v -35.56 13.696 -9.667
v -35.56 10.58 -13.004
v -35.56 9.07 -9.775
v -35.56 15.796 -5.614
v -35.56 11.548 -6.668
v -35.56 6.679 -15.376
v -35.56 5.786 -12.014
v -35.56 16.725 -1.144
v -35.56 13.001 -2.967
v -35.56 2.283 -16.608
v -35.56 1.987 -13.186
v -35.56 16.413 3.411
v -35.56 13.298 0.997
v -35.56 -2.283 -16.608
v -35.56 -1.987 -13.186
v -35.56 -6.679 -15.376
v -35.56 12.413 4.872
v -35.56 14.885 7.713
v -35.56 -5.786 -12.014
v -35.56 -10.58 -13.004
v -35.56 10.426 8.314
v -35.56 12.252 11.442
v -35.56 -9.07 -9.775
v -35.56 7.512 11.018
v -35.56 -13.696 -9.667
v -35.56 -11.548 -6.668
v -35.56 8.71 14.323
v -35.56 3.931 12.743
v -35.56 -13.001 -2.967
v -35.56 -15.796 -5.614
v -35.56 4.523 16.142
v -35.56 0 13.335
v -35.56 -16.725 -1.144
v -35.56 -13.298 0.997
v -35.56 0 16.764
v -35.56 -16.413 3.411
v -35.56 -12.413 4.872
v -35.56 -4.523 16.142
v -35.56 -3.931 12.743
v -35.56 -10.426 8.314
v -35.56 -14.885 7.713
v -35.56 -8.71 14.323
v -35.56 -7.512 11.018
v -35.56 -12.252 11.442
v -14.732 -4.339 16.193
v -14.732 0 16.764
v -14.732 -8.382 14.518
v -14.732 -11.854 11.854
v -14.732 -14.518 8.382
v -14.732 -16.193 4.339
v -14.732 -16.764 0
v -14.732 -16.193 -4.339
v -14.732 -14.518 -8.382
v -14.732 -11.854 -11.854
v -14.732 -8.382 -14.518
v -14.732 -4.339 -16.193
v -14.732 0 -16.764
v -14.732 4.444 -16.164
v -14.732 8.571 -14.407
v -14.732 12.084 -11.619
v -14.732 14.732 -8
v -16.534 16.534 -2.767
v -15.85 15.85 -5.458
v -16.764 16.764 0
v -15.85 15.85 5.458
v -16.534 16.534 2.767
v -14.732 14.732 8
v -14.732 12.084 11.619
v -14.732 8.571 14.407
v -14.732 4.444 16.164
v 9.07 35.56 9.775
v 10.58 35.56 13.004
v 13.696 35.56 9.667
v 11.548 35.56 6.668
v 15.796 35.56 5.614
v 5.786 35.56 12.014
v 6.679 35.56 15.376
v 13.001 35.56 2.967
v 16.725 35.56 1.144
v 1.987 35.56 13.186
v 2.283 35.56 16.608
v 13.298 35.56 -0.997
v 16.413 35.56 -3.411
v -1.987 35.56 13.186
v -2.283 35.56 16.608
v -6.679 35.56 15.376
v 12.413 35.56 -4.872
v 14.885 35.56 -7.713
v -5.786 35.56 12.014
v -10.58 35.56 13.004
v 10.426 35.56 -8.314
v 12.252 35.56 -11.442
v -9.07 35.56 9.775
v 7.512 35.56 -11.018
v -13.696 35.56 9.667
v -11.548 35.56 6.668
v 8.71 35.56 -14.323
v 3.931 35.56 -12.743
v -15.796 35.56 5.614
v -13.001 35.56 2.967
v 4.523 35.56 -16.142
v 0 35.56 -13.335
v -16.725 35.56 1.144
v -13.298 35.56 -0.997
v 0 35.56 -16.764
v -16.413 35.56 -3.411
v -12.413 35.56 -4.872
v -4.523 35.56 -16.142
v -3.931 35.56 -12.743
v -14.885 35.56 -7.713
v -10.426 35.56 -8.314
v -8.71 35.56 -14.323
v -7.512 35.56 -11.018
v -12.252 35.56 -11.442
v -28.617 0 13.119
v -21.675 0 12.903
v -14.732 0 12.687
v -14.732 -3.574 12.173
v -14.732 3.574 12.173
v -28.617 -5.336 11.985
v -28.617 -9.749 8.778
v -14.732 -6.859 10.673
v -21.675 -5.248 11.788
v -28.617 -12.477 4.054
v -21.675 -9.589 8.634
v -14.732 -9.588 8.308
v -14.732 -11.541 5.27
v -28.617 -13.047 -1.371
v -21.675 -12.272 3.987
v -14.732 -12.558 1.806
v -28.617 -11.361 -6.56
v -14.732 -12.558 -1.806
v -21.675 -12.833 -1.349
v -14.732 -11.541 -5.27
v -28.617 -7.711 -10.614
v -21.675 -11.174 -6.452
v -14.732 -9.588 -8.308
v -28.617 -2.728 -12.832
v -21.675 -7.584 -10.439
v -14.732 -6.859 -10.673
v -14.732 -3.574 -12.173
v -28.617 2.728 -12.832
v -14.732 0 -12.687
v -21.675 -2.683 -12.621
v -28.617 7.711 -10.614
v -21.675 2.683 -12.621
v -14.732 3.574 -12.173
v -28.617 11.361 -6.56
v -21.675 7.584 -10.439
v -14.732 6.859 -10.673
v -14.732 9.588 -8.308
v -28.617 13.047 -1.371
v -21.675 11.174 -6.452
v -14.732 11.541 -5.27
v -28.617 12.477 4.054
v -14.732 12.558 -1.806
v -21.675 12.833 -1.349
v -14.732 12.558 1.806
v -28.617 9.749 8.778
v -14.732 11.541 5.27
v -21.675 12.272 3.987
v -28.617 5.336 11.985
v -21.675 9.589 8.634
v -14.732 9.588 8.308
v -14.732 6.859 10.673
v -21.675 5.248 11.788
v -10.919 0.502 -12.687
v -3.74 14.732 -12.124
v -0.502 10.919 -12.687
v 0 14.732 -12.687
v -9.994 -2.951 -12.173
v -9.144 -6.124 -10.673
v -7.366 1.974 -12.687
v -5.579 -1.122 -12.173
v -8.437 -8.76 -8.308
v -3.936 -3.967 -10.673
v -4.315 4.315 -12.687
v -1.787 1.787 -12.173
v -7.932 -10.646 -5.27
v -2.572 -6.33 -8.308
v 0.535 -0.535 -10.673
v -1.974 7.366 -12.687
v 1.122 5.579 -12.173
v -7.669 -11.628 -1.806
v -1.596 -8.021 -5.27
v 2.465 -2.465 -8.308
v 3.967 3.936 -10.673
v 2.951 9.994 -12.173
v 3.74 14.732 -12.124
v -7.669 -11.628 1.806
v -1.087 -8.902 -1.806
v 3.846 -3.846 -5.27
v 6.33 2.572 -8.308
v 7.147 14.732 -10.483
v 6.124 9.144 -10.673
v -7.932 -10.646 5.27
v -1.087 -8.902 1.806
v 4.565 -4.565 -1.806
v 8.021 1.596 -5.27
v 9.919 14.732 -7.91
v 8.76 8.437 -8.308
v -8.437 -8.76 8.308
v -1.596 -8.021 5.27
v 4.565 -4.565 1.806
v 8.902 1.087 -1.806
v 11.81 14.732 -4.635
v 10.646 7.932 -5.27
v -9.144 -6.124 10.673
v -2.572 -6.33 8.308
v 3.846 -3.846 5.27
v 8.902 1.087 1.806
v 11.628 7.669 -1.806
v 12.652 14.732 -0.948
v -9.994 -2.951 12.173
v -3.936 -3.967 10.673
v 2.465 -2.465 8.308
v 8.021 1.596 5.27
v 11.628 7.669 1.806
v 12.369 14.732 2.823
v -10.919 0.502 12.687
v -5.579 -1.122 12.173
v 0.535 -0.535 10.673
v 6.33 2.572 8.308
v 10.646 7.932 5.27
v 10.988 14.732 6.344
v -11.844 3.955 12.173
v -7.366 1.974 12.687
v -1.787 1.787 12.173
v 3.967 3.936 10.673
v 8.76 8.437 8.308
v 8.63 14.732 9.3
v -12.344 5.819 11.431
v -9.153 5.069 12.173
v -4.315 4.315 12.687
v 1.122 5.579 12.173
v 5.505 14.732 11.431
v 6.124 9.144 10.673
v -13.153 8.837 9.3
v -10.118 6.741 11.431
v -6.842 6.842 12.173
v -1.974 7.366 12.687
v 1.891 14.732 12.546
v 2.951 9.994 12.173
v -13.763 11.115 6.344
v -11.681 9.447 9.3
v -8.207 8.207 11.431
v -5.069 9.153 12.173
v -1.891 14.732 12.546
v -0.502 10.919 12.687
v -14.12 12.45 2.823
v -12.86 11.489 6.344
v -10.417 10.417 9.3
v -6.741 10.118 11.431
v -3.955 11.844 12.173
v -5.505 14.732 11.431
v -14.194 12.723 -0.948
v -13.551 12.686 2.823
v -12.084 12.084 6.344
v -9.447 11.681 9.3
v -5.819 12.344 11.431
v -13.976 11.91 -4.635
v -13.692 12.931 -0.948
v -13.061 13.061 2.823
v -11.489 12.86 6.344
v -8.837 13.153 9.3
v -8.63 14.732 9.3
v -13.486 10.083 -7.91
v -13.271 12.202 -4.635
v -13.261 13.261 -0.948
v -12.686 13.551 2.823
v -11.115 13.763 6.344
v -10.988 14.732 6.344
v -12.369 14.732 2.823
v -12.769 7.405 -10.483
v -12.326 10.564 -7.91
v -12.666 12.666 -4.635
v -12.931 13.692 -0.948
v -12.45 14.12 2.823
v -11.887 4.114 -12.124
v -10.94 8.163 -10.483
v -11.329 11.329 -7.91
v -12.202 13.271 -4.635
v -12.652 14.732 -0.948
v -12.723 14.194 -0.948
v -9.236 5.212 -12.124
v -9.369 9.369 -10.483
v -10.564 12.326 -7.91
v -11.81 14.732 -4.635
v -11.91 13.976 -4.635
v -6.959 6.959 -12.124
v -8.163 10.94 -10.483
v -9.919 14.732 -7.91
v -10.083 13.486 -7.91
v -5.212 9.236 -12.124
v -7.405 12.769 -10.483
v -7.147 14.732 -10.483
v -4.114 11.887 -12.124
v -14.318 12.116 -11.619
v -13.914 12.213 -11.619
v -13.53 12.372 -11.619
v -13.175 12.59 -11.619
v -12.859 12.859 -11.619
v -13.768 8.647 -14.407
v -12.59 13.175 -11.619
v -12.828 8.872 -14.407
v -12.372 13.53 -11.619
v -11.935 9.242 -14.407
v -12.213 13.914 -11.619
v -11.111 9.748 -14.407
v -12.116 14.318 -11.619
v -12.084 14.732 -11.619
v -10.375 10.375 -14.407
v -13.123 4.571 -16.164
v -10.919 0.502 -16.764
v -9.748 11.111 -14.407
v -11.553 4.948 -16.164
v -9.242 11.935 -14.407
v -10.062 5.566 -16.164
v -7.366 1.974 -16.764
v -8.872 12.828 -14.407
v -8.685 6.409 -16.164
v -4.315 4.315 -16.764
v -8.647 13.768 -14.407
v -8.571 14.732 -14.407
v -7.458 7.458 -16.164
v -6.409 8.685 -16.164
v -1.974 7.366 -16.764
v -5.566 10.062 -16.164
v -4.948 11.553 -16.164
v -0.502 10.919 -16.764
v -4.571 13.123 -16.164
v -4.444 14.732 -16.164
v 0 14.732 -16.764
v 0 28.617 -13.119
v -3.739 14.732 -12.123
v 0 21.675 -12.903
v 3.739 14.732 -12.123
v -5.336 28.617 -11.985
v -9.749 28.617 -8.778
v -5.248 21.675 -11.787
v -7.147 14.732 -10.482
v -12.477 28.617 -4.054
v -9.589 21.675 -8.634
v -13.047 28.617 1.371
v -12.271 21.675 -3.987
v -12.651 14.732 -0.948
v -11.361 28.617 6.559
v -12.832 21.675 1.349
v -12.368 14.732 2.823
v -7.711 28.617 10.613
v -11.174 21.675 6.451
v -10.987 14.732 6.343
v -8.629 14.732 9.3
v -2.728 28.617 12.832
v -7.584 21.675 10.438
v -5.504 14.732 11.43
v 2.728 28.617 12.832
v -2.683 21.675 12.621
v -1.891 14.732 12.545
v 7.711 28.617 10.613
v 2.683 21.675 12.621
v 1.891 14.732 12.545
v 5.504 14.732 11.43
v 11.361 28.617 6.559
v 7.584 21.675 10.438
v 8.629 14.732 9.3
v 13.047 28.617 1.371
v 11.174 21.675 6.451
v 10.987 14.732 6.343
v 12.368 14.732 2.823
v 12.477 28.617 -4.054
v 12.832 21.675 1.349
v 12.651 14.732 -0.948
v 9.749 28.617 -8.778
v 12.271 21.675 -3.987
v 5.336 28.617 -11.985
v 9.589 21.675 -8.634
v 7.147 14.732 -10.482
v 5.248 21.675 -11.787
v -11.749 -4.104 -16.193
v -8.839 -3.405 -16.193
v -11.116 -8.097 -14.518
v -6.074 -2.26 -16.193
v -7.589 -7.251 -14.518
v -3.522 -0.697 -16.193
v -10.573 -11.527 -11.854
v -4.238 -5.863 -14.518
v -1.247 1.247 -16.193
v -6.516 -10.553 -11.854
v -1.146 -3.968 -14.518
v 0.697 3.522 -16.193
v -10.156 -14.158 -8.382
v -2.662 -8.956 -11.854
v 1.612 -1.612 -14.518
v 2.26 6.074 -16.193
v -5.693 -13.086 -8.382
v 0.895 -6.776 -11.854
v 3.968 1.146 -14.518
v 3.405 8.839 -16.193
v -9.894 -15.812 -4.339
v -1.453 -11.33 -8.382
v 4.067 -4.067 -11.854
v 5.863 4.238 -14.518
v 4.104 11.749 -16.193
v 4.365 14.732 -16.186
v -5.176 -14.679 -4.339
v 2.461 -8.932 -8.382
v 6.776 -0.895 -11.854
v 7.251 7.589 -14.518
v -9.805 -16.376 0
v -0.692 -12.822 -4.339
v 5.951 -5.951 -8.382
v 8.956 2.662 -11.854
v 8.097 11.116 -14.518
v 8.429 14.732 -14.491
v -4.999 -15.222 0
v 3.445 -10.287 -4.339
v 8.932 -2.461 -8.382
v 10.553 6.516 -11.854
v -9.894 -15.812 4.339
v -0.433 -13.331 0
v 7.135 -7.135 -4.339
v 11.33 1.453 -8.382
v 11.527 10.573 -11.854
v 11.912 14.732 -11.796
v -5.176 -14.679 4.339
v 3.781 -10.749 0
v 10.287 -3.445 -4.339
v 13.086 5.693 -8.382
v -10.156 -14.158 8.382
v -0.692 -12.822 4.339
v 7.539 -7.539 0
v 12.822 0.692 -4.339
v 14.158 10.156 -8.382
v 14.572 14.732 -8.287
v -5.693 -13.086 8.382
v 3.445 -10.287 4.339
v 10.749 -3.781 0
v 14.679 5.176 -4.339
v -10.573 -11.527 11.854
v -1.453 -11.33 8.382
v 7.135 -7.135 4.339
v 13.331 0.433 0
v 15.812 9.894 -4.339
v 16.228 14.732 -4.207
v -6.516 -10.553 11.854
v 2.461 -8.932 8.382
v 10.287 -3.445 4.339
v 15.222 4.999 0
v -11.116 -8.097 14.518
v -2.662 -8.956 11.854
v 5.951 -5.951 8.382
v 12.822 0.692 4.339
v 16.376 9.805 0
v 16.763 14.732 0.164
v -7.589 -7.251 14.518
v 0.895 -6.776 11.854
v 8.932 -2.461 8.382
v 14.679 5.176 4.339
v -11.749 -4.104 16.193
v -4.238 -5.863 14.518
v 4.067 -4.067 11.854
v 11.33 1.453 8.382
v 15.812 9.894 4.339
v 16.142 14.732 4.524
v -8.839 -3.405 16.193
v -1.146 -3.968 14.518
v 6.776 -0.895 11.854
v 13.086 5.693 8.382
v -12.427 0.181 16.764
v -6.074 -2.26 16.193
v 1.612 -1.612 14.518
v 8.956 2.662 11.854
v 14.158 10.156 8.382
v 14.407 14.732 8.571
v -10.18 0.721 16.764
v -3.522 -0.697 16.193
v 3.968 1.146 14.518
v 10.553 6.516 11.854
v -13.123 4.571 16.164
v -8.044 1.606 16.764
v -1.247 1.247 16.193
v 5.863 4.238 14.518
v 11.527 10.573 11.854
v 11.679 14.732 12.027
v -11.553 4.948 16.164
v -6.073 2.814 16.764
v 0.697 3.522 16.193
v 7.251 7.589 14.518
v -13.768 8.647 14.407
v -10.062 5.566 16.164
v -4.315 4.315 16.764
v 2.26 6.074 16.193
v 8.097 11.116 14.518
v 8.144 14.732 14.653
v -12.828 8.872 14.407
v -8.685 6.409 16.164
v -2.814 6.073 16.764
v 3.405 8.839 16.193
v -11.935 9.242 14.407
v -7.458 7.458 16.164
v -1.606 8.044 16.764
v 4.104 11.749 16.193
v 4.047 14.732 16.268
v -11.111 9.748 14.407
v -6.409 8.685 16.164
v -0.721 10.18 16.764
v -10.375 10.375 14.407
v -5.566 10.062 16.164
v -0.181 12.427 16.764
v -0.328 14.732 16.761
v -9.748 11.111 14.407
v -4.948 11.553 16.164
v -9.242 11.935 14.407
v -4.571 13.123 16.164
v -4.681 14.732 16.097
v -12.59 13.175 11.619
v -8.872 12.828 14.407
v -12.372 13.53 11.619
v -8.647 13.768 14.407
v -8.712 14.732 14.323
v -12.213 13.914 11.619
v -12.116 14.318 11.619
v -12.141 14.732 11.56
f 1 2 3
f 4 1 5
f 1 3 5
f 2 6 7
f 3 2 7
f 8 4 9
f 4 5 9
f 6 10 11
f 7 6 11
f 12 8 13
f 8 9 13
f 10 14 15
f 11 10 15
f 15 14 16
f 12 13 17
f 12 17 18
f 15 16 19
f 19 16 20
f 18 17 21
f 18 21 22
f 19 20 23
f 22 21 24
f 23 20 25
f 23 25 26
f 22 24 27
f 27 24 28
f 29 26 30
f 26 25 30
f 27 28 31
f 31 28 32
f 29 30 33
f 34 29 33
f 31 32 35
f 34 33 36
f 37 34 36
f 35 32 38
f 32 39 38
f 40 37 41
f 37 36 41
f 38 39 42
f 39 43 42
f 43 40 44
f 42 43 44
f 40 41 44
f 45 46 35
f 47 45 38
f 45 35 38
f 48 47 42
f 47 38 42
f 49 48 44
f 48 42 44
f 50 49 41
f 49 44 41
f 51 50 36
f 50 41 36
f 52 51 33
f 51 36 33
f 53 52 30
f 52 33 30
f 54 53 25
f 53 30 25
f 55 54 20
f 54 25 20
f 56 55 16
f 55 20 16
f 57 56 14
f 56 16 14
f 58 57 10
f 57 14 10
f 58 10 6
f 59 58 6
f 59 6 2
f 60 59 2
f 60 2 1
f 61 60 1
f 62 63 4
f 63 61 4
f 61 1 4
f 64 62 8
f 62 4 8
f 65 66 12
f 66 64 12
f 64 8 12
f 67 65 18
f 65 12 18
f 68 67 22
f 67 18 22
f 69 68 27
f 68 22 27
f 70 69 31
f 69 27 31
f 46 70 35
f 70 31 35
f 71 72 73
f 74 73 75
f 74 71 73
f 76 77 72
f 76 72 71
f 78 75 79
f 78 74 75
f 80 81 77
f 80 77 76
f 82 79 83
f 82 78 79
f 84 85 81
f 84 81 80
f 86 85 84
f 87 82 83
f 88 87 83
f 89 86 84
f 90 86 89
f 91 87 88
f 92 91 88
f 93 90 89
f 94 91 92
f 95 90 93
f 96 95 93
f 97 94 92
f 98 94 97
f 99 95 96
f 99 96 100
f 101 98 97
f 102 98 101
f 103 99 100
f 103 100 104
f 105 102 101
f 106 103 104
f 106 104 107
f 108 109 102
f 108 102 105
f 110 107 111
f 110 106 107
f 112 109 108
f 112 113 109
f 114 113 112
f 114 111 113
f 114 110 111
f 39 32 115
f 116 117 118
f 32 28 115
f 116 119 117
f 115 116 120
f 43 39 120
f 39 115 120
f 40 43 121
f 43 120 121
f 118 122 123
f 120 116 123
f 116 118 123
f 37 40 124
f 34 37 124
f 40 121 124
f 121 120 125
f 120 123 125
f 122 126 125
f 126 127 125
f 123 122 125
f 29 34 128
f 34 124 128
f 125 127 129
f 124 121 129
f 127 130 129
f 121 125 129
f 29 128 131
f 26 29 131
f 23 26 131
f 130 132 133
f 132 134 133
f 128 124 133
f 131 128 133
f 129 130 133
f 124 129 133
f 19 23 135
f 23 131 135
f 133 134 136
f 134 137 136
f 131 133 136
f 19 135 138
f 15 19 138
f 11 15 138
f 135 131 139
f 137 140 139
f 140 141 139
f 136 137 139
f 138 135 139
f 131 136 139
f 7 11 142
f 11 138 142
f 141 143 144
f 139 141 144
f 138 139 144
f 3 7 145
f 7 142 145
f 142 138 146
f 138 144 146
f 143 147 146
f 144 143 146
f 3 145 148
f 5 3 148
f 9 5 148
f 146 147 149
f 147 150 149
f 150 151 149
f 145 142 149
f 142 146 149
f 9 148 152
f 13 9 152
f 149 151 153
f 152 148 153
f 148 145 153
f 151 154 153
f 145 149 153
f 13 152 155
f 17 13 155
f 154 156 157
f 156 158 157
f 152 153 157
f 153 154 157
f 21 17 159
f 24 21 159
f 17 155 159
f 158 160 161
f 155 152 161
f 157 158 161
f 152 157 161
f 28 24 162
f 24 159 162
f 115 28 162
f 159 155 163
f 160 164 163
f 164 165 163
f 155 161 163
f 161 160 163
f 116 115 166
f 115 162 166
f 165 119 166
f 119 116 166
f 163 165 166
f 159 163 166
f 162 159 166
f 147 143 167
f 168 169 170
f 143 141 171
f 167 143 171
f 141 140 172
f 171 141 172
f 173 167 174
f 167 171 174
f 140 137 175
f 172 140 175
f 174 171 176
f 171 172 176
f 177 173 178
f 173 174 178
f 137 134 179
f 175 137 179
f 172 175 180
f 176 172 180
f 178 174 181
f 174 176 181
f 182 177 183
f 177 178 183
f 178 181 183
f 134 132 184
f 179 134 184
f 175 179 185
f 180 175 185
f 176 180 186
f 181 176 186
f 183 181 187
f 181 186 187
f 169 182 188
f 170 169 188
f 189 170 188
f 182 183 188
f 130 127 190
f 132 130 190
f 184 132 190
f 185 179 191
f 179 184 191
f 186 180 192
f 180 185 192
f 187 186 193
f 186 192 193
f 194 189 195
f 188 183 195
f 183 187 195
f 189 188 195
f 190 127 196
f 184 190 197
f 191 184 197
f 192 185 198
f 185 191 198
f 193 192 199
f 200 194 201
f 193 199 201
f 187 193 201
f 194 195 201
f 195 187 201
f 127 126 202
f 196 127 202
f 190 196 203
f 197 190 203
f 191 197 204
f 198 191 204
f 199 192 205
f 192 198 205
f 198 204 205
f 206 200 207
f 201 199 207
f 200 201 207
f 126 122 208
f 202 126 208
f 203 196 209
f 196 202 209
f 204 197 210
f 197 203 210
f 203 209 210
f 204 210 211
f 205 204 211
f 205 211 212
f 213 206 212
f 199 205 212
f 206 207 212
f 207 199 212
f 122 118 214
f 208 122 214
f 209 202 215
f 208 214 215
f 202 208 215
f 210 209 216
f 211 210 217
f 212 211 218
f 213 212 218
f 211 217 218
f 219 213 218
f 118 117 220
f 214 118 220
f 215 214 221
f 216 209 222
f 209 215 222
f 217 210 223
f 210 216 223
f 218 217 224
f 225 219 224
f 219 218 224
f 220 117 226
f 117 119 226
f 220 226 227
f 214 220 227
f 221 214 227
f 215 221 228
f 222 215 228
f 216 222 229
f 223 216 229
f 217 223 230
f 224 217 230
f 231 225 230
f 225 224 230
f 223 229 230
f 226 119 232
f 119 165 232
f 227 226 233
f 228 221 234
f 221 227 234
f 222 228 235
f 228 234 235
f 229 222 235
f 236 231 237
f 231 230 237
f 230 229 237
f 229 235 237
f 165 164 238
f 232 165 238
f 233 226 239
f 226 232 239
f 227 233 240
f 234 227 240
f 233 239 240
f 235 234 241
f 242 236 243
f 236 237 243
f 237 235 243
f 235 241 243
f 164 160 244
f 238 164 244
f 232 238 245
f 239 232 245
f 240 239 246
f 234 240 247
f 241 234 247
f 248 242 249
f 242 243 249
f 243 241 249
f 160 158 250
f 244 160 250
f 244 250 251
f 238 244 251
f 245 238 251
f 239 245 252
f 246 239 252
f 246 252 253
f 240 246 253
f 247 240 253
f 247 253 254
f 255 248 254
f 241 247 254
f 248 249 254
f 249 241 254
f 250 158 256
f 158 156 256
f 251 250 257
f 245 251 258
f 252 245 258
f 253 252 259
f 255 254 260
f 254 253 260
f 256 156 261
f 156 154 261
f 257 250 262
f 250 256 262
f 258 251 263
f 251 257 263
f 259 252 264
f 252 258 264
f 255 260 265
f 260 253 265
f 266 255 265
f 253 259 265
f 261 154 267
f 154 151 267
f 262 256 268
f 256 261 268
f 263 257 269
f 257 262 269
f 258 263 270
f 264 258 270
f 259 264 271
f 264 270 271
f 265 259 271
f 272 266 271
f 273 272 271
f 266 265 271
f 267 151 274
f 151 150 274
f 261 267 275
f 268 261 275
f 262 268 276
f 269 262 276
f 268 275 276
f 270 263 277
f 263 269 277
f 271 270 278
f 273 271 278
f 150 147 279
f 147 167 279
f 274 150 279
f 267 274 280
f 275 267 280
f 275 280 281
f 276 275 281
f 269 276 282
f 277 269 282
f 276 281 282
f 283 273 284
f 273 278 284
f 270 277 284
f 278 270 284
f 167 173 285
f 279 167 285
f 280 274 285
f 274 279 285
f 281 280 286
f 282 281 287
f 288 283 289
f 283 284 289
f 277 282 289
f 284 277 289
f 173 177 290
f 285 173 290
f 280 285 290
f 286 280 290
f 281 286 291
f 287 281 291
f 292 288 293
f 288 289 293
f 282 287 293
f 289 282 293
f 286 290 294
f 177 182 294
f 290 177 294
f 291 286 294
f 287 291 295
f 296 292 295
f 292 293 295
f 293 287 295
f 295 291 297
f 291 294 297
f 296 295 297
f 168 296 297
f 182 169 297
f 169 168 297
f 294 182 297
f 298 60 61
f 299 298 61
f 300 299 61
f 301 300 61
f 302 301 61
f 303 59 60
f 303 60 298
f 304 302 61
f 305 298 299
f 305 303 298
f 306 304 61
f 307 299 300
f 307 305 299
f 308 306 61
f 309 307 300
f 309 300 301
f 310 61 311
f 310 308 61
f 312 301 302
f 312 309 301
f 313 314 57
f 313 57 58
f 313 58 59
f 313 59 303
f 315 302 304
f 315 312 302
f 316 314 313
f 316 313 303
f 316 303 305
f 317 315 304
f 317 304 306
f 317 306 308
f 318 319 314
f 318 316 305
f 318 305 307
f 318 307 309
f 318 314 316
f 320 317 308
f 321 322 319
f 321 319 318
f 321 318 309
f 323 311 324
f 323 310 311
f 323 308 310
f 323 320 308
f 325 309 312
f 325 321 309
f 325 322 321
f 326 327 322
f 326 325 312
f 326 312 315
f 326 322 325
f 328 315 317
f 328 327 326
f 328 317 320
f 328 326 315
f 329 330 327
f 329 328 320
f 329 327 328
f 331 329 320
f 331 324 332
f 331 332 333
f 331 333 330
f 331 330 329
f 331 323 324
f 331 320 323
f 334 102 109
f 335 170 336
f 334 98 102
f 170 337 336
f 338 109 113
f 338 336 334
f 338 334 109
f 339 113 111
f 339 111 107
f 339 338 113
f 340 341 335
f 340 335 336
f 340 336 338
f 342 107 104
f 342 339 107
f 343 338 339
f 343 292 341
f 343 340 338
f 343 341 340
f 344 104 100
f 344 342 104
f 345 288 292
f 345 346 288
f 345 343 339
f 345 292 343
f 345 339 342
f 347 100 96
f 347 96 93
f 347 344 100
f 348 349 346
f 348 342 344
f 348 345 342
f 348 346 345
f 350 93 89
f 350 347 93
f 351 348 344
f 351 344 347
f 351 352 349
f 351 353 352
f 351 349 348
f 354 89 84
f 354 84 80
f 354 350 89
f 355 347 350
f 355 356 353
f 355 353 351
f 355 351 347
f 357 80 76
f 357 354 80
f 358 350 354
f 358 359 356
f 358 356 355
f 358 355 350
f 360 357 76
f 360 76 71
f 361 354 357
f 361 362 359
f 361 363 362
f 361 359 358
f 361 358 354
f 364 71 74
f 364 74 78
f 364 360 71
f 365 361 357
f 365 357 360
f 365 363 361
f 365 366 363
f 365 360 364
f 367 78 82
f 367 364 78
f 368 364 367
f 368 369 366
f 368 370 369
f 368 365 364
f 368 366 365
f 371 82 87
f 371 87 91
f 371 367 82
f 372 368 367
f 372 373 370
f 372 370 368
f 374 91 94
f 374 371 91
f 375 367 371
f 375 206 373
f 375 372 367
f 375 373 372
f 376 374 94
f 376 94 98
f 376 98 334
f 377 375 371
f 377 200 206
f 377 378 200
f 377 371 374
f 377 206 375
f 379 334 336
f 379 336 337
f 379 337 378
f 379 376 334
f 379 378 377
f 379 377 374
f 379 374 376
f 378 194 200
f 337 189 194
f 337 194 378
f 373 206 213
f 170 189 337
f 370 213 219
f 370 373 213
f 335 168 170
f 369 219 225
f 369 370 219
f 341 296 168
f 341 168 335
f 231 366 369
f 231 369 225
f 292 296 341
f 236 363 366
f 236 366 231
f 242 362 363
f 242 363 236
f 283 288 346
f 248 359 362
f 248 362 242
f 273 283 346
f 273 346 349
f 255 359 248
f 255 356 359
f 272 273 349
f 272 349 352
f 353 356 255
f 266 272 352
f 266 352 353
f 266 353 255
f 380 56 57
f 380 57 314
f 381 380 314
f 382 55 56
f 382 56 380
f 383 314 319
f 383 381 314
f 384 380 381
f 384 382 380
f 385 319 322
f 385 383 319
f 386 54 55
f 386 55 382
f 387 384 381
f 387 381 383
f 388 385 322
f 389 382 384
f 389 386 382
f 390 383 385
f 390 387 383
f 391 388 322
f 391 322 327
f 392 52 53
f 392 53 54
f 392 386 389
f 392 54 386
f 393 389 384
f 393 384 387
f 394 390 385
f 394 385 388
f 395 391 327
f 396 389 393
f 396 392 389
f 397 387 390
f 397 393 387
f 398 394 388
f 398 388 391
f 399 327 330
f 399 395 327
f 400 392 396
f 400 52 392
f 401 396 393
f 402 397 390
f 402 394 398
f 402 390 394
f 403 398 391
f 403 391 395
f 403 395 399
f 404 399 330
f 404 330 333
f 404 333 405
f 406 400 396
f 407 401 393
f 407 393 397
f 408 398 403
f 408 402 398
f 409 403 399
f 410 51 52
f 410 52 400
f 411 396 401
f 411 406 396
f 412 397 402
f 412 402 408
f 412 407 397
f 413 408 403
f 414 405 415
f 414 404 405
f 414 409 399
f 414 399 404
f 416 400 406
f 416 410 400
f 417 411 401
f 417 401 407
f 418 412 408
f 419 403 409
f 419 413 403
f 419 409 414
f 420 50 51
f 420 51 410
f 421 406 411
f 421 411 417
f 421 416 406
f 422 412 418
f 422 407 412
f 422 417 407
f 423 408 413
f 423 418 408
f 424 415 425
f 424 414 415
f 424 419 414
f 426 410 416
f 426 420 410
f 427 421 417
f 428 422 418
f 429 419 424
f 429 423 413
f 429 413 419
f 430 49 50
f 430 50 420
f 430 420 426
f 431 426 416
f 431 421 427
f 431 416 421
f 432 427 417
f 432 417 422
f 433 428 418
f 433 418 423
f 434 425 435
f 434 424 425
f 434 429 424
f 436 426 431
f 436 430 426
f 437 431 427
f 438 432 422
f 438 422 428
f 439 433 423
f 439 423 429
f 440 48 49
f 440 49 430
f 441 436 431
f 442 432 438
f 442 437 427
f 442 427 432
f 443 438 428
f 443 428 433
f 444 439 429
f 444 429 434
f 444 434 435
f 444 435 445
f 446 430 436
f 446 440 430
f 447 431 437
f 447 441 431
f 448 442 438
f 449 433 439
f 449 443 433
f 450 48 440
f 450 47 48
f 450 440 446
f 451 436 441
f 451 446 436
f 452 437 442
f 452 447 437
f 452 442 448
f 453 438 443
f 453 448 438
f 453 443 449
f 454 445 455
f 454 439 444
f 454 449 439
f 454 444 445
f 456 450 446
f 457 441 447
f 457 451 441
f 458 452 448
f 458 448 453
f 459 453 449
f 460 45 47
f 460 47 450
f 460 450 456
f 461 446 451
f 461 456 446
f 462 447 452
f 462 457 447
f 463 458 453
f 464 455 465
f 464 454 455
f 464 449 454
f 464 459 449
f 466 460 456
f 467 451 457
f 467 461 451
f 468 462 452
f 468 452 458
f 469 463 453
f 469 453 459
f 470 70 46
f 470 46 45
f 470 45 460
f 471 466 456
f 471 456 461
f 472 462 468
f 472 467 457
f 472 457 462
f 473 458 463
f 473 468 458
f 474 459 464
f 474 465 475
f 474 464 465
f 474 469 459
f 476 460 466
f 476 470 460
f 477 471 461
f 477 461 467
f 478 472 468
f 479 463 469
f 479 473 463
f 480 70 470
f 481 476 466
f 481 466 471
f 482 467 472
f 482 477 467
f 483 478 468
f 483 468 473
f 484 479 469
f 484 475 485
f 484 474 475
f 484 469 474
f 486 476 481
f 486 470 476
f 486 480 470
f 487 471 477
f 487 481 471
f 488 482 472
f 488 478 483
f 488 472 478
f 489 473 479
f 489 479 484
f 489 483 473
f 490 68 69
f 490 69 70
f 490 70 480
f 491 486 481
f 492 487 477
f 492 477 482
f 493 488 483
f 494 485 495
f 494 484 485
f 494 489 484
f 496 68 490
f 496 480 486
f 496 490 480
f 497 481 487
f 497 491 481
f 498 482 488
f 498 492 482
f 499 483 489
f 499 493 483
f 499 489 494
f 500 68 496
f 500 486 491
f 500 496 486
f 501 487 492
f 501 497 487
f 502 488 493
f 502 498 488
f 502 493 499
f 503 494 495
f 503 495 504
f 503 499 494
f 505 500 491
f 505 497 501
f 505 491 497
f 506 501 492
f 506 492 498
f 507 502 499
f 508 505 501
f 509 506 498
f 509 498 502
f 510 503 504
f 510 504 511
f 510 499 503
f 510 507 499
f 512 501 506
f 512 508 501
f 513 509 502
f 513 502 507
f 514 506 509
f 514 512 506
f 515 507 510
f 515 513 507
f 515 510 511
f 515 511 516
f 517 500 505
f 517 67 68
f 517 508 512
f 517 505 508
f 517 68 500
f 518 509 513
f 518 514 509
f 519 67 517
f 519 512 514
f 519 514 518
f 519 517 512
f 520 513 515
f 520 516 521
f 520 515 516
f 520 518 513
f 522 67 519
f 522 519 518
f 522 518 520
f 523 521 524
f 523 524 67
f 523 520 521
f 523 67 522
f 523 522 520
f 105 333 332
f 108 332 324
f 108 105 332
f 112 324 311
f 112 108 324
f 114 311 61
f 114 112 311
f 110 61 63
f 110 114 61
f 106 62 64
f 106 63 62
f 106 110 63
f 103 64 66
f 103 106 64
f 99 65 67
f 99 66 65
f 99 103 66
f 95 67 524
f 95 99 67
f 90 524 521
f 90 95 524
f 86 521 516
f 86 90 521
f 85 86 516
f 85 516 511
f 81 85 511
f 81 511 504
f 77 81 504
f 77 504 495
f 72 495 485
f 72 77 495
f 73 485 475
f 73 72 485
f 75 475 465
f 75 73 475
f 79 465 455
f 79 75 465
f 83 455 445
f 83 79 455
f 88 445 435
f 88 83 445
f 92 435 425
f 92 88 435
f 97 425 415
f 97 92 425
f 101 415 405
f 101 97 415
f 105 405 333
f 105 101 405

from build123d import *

# Parameters (mm, degrees)
SKETCH3_R   = 16.764
SKETCH3_R_2 = 12.6873


with BuildPart() as part:
    # Sketch1 → Revolve1 (revolve)
    with BuildSketch(Plane.XY):
        Polygon((-14.732, -12.6873), (-14.732, -16.764), (-35.56, -16.764), (-35.56, -13.335), align=None)
    revolve(axis=Axis((-35.56, 0, 0), (1, 0, 0)))


with BuildPart() as body_2:
    # Sketch2 → Revolve2 (revolve)
    with BuildSketch(Plane.XY):
        Polygon((13.335, 35.56), (12.686518, 14.732), (16.764, 14.732), (16.764, 35.56), align=None)
    revolve(axis=Axis((0, 0, 0), (0, 1, 0)))


with BuildPart() as sweep1_tool:
    # Sweep1: sweep along a path in Sketch4
    with BuildLine(Plane.XY) as sweep1_path:
        ThreePointArc((-14.732, 0), (-4.314903, 4.314903), (0, 14.732))
    # Sketch3 → Sweep1 (sweep)
    with BuildSketch(Plane(origin=(-14.732, 0, 0), x_dir=(0, 0, -1), z_dir=(1, 0, 0))):
        Circle(SKETCH3_R)
        Circle(SKETCH3_R_2, mode=Mode.SUBTRACT)
    sweep(path=sweep1_path.line)


with BuildPart() as part_1:
    add(part.part)


with BuildPart() as part_2:
    # Sweep1: joined with sweep1_tool
    add(part_1.part.fuse(sweep1_tool.part, body_2.part, tol=0.00001))


solid = part_2.part
